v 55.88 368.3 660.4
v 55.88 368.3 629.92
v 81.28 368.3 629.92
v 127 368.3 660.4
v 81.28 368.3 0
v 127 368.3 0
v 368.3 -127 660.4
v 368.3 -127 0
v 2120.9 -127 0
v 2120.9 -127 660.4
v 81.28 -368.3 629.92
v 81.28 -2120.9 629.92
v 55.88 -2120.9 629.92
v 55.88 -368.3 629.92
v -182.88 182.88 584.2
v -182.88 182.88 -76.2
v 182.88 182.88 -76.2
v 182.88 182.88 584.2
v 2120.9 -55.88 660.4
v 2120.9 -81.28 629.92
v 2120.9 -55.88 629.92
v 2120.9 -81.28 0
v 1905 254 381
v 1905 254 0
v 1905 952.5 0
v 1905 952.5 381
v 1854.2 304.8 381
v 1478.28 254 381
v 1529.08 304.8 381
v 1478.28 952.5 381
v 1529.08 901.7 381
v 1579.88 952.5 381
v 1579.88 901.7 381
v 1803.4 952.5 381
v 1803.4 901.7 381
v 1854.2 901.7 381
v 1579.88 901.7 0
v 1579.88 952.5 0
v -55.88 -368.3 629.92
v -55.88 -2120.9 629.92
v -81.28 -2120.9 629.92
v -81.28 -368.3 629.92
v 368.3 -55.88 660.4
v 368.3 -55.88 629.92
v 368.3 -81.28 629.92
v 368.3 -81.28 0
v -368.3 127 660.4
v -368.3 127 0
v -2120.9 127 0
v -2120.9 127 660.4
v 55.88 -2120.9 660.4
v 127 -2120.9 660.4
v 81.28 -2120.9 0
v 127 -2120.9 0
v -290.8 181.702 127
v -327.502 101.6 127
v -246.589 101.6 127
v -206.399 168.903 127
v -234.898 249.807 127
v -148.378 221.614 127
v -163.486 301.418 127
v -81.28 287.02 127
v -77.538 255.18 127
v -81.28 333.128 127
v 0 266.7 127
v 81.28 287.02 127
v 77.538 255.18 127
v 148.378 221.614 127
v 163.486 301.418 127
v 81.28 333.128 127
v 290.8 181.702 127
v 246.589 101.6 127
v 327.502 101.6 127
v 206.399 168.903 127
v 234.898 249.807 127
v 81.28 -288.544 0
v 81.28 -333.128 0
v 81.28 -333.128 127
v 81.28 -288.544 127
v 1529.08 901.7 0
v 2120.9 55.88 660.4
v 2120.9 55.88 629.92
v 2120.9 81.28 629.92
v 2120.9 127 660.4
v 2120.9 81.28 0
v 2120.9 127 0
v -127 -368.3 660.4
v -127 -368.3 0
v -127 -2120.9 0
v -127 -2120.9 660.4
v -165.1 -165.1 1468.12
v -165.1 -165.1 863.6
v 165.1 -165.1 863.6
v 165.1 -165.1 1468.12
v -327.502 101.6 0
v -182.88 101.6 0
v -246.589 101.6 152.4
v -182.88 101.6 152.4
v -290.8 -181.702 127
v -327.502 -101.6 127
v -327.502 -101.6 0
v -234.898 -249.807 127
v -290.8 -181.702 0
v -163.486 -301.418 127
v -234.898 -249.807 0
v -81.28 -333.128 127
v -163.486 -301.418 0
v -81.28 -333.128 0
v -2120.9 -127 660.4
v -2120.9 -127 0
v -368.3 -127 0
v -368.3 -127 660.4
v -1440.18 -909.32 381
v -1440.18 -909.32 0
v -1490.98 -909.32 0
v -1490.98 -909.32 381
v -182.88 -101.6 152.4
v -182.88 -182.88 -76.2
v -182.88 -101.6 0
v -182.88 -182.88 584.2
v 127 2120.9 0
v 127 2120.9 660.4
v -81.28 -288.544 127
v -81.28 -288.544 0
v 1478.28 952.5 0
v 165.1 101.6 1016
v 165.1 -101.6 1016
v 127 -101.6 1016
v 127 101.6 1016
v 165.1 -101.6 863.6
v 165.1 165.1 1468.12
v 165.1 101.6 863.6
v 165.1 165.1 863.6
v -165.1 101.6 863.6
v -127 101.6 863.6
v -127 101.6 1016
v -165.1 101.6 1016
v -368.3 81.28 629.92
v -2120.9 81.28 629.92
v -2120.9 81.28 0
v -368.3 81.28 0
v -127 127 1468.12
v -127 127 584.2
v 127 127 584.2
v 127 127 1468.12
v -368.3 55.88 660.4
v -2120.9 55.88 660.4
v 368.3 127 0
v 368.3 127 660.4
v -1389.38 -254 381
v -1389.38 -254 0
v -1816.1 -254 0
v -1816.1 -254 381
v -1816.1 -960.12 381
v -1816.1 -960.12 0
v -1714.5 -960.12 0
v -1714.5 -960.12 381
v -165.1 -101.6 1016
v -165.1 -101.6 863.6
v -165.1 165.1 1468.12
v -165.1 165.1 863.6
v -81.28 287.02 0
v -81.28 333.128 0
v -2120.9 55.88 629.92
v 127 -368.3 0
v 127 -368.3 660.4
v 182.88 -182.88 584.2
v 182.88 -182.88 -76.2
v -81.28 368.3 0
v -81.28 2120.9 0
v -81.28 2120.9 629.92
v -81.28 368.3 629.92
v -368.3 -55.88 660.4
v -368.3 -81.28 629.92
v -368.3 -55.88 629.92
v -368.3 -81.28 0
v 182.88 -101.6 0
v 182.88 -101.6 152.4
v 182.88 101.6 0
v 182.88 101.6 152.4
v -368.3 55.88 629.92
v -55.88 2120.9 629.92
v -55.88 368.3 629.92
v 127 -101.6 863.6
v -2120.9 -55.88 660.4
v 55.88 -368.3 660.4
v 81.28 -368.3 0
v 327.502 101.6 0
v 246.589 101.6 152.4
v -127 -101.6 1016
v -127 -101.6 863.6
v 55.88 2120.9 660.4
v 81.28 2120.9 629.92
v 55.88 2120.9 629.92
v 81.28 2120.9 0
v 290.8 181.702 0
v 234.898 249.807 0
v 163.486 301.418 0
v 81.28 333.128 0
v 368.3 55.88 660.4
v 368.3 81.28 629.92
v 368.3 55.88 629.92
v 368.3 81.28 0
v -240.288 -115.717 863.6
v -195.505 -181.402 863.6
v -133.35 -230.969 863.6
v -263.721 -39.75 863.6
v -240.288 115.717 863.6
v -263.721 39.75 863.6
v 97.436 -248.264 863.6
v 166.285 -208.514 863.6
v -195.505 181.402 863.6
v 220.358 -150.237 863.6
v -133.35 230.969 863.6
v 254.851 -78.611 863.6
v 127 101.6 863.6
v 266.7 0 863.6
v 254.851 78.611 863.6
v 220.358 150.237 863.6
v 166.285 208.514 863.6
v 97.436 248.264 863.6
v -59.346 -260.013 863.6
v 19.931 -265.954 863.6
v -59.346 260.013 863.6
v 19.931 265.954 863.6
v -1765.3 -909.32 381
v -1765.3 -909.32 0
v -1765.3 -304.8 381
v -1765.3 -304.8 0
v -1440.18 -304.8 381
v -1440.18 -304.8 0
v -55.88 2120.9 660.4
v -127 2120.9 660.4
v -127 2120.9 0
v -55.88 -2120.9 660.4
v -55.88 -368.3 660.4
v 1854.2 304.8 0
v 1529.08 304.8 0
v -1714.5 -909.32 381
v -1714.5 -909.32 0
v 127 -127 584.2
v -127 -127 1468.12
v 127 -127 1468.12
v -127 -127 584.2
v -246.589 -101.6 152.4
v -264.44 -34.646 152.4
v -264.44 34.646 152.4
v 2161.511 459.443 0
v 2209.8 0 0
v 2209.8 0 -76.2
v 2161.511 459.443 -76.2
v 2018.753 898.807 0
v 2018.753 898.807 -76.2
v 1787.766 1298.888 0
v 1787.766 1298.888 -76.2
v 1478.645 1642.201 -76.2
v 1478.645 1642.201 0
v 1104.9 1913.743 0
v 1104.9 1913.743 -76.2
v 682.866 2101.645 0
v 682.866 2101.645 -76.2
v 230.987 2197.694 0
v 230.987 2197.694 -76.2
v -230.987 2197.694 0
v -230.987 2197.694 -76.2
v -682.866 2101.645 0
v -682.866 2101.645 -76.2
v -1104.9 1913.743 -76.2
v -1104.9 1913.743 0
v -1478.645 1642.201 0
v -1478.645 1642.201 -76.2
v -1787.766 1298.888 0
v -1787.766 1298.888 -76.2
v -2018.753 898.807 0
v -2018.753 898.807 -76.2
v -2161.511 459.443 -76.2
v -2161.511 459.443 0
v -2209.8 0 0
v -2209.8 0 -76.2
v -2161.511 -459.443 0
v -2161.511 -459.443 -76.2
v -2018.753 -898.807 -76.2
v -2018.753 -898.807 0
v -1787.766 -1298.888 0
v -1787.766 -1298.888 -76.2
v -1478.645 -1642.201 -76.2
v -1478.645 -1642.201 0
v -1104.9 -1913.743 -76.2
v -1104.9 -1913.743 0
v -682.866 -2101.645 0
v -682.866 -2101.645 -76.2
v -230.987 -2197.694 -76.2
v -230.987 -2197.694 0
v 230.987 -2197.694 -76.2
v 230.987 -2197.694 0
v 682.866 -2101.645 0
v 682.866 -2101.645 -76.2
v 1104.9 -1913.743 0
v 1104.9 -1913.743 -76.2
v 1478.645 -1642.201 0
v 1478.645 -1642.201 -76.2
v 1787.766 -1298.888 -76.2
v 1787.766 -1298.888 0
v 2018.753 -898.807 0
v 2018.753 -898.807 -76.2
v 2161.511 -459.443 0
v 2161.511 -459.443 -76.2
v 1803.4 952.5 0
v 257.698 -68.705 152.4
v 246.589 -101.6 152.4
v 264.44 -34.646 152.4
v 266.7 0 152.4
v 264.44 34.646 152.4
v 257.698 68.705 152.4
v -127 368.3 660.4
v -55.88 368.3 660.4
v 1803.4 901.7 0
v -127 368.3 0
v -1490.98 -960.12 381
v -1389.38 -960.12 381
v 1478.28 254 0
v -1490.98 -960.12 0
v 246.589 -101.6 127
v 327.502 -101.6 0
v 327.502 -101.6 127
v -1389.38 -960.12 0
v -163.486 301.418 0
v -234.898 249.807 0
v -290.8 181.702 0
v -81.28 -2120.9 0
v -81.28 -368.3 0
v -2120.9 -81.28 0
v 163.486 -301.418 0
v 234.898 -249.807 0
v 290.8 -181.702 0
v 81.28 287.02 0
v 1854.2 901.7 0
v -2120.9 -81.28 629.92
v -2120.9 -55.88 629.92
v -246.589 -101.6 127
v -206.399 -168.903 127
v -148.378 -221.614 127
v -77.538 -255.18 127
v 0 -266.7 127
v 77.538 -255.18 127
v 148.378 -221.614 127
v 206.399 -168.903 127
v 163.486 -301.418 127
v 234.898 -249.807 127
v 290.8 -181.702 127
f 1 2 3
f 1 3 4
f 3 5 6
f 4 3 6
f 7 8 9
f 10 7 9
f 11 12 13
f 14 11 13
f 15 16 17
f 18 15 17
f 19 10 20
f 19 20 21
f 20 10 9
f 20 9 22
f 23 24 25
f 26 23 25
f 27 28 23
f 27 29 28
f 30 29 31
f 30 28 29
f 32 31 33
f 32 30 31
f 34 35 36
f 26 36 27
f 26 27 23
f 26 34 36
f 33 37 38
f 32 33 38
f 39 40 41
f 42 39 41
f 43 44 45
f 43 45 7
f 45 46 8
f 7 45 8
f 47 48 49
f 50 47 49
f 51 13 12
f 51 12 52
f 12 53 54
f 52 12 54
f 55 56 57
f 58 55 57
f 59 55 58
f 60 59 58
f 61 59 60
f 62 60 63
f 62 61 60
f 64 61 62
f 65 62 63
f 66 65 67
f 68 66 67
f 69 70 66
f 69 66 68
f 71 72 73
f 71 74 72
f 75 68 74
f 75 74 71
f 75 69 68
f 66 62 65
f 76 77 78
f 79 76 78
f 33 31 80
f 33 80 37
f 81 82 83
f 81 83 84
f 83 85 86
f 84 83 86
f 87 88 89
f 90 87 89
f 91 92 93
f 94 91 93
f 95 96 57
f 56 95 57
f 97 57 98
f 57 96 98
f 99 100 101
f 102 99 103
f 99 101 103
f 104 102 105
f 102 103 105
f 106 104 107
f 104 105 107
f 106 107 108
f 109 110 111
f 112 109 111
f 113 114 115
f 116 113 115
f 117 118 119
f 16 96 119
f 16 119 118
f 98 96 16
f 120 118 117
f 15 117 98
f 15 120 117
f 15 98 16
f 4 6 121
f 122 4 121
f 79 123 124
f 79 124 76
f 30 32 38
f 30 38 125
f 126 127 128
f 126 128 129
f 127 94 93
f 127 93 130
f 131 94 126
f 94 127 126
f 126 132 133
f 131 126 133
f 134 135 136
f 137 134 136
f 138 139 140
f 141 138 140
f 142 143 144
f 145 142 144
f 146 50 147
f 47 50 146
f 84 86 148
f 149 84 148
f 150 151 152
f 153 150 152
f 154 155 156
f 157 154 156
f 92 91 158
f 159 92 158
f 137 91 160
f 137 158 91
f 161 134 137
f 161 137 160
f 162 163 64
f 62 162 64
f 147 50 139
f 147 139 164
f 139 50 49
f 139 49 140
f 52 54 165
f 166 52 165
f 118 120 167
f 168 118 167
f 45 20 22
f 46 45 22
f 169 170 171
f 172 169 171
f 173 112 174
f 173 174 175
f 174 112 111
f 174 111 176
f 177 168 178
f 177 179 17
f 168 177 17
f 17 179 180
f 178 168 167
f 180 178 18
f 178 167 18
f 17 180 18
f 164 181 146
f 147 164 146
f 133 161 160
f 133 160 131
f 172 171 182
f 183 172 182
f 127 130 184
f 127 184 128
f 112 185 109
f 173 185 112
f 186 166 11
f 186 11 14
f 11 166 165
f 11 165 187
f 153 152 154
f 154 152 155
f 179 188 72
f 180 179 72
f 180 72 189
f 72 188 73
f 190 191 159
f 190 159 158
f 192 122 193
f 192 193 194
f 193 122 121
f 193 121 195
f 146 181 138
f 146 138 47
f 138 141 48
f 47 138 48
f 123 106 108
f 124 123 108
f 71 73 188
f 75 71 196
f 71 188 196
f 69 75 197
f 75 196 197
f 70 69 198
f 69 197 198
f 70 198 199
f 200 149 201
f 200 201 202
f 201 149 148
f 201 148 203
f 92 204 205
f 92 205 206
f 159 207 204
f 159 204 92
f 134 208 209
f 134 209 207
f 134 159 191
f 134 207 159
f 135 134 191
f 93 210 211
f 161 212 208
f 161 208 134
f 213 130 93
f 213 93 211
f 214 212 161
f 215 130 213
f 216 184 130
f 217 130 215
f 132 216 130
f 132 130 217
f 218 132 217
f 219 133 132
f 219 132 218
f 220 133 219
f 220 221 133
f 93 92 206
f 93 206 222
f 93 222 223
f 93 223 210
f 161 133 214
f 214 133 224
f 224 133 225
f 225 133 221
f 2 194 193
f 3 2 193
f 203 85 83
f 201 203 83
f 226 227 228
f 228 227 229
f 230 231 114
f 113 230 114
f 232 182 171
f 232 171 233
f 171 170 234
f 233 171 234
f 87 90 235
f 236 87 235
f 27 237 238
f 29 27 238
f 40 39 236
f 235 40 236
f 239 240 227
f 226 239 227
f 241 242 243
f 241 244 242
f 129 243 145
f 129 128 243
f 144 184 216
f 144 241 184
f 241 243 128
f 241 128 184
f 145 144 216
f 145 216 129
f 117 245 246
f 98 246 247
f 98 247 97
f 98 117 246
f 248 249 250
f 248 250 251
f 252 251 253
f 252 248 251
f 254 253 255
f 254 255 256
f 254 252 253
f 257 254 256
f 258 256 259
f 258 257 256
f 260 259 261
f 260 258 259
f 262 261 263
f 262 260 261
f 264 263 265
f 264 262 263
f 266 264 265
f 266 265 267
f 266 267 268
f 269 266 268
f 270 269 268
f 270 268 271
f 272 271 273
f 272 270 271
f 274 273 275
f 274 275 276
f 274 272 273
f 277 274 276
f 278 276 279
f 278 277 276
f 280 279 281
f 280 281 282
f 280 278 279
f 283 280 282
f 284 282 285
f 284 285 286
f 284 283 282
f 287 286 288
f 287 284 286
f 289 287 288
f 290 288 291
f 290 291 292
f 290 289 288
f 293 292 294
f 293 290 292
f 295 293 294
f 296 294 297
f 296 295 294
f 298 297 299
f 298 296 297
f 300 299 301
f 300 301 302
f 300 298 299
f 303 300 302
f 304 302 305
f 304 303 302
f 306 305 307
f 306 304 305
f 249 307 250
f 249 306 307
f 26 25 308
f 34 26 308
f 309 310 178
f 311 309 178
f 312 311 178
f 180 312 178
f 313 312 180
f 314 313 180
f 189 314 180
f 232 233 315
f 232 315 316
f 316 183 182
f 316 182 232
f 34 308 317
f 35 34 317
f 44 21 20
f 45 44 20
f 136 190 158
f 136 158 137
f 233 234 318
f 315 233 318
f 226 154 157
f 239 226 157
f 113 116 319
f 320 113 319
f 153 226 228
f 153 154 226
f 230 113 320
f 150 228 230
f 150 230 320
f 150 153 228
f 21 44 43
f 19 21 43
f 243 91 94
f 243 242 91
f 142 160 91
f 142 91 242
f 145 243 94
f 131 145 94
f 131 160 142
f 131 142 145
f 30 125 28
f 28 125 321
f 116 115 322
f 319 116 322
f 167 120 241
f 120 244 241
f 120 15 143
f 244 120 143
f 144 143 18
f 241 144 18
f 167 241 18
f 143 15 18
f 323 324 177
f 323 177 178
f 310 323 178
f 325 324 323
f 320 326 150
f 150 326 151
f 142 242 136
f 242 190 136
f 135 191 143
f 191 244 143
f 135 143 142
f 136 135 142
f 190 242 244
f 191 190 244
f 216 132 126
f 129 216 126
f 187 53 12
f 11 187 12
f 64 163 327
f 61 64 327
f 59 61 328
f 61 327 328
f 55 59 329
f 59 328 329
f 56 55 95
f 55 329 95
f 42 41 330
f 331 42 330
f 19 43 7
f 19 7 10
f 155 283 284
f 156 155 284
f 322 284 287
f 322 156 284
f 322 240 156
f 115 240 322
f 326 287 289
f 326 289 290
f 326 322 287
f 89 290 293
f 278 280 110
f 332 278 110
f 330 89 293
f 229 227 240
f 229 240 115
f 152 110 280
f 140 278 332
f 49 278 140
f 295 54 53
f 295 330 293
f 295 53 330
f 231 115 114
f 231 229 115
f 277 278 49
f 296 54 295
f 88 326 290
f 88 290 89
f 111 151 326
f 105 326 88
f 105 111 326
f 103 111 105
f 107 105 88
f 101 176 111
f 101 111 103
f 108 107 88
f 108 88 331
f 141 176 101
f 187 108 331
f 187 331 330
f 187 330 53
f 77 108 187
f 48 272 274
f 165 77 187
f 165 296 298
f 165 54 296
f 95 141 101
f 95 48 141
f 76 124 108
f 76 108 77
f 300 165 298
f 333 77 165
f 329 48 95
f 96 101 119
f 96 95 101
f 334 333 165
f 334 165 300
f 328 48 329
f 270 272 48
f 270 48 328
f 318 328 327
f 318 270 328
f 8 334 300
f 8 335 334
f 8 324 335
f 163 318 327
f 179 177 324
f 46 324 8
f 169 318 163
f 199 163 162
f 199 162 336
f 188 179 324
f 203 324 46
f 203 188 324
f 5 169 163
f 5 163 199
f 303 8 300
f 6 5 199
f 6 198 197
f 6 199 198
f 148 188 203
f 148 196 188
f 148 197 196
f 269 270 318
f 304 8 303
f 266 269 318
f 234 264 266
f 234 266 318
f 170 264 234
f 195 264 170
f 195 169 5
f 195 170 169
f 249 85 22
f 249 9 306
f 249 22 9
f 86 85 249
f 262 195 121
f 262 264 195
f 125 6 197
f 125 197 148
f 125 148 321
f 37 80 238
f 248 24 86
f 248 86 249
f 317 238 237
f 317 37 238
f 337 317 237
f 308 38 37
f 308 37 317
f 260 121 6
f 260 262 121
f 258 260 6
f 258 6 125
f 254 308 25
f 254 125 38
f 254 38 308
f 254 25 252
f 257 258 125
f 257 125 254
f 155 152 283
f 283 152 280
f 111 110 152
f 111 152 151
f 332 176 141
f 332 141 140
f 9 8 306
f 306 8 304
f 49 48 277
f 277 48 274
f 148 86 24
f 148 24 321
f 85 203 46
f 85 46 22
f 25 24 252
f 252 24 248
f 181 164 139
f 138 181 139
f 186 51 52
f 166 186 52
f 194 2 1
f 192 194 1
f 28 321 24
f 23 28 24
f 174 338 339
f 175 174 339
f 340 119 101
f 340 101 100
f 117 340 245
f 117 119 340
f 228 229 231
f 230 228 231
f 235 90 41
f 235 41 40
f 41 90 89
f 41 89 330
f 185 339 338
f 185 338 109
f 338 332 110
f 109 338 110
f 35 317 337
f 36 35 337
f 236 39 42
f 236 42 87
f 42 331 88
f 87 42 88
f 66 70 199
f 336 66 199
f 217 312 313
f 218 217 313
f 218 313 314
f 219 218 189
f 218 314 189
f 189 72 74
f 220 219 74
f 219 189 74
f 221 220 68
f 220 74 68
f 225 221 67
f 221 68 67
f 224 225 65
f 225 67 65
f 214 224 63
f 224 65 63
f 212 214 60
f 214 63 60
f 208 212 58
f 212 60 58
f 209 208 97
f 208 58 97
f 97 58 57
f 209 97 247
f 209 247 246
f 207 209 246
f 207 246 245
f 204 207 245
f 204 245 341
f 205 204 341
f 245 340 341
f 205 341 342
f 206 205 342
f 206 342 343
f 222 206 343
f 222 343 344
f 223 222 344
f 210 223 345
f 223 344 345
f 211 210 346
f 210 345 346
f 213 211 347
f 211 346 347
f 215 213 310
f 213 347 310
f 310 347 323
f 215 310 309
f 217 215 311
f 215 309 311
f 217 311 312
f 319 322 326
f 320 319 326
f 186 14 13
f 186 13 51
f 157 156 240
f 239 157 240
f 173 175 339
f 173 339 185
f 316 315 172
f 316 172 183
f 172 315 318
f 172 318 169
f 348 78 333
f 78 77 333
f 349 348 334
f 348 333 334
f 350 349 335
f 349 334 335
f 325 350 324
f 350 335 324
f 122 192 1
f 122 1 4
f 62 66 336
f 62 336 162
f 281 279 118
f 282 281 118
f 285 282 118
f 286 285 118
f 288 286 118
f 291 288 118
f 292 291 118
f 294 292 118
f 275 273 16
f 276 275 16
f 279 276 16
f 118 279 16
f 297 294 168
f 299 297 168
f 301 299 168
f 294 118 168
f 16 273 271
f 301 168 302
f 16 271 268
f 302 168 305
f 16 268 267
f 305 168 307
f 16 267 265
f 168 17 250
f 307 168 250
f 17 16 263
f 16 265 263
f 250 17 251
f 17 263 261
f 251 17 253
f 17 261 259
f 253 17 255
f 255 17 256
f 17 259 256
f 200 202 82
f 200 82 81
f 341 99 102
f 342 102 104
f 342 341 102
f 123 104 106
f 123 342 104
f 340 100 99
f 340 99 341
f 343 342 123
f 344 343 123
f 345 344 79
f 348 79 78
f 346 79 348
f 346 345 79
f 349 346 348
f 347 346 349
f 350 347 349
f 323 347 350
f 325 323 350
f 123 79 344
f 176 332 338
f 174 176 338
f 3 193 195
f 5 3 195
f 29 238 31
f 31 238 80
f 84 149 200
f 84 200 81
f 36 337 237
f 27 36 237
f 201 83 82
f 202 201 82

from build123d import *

# Parameters (mm, degrees)
F0_R      = 2209.8
F0_R_2    = 342.9
F0_R_3    = 266.7
F0_W      = 365.76
F0_H      = 365.76
F0_W_2    = 223.52
F0_H_2    = 50.8
F1_DEPTH  = 76.2
F0_W_3    = 355.6
F0_H_3    = 355.6
F0_W_4    = 254
F0_H_4    = 254
F2_DEPTH  = 863.6
F3_DEPTH  = 584.2
F4_W      = 330.2
F4_H      = 330.2
F4_W_2    = 254
F4_H_2    = 254
F5_DEPTH  = 604.52
F6_DEPTH  = 127
F7_W      = 203.2
F7_H      = 152.4
F8_DEPTH  = 350.52
F9_DEPTH  = 660.4
F10_W     = 111.76
F10_H     = 30.48
F11_DEPTH = 1832.356
F12_W     = 111.76
F12_H     = 31.626664176
F13_DEPTH = 1793.24
F14_W     = 111.76
F14_H     = 31.626664176
F15_DEPTH = 1833.88
F16_W     = 111.76
F16_H     = 31.626664176
F17_DEPTH = 1811.02
F18_DEPTH = 381
F19_W     = 203.2
F19_H     = 152.4
F20_DEPTH = 347.472


# Not quite as in the source:
# - a feature names something its author has since deleted; it is built from what else it names


with BuildPart() as f1:
    # F0 (on Top) → F1 (new body)
    with BuildSketch(Plane.XY):
        Circle(F0_R)
        Polygon((-1490.98, -960.12), (-1714.5, -960.12), (-1816.1, -960.12), (-1816.1, -254), (-1389.38, -254), (-1389.38, -960.12), align=None, mode=Mode.SUBTRACT)
        Polygon((127, -2120.9), (-127, -2120.9), (-127, -368.3), (-1.175e-06, -368.3), (127, -368.3), align=None, mode=Mode.SUBTRACT)
        Polygon((-368.3, 127), (-368.3, 5.095e-07), (-368.3, -127), (-2120.9, -127), (-2120.9, 127), align=None, mode=Mode.SUBTRACT)
        with BuildLine():
            ThreePointArc((368.3, 0), (260.4274270956, -260.4274279264), (-1.175e-06, -368.3))
            ThreePointArc((-1.175e-06, -368.3), (-260.4274281066, -260.4274269154), (-368.3, 5.095e-07))
            ThreePointArc((-368.3, 5.095e-07), (-260.4274272736, 260.4274277484), (1.62e-07, 368.3))
            ThreePointArc((1.62e-07, 368.3), (260.4274275683, 260.4274274537), (368.3, 0))
        make_face(mode=Mode.SUBTRACT)
        Polygon((368.3, -127), (368.3, 0), (368.3, 127), (2120.9, 127), (2120.9, -127), align=None, mode=Mode.SUBTRACT)
        Polygon((1579.88, 952.5), (1803.4, 952.5), (1905, 952.5), (1905, 254), (1478.28, 254), (1478.28, 952.5), align=None, mode=Mode.SUBTRACT)
        Polygon((127, 368.3), (1.62e-07, 368.3), (-127, 368.3), (-127, 2120.9), (127, 2120.9), align=None, mode=Mode.SUBTRACT)
        Polygon((-127, 368.3), (1.62e-07, 368.3), (127, 368.3), (127, 2120.9), (-127, 2120.9), align=None)
        Polygon((368.3, 127), (368.3, 0), (368.3, -127), (2120.9, -127), (2120.9, 127), align=None)
        Polygon((-368.3, -127), (-368.3, 5.095e-07), (-368.3, 127), (-2120.9, 127), (-2120.9, -127), align=None)
        Polygon((-127, -368.3), (-127, -2120.9), (127, -2120.9), (127, -368.3), (-1.175e-06, -368.3), align=None)
        with BuildLine():
            ThreePointArc((-368.3, 5.095e-07), (-260.4274281066, -260.4274269154), (-1.175e-06, -368.3))
            ThreePointArc((-1.175e-06, -368.3), (260.4274270956, -260.4274279264), (368.3, 0))
            ThreePointArc((368.3, 0), (260.4274275683, 260.4274274537), (1.62e-07, 368.3))
            ThreePointArc((1.62e-07, 368.3), (-260.4274272736, 260.4274277484), (-368.3, 5.095e-07))
        make_face()
        Circle(F0_R_2, mode=Mode.SUBTRACT)
        Circle(F0_R_2)
        Circle(F0_R_3, mode=Mode.SUBTRACT)
        Circle(F0_R_3)
        Rectangle(F0_W, F0_H, mode=Mode.SUBTRACT)
        Polygon((-1440.18, -304.8), (-1765.3, -304.8), (-1765.3, -909.32), (-1714.5, -909.32), (-1490.98, -909.32), (-1440.18, -909.32), align=None)
        Polygon((1529.08, 304.8), (1854.2, 304.8), (1854.2, 901.7), (1803.4, 901.7), (1579.88, 901.7), (1529.08, 901.7), align=None)
        Polygon((-1765.3, -909.32), (-1765.3, -304.8), (-1440.18, -304.8), (-1440.18, -909.32), (-1490.98, -909.32), (-1490.98, -960.12), (-1389.38, -960.12), (-1389.38, -254), (-1816.1, -254), (-1816.1, -960.12), (-1714.5, -960.12), (-1714.5, -909.32), align=None)
        Polygon((1854.2, 901.7), (1854.2, 304.8), (1529.08, 304.8), (1529.08, 901.7), (1579.88, 901.7), (1579.88, 952.5), (1478.28, 952.5), (1478.28, 254), (1905, 254), (1905, 952.5), (1803.4, 952.5), (1803.4, 901.7), align=None)
        with Locations((1691.64, 927.1)):
            Rectangle(F0_W_2, F0_H_2)
        with Locations((-1602.74, -934.72)):
            Rectangle(F0_W_2, F0_H_2)
    extrude(amount=-F1_DEPTH)

    # F0 (on Top) → F2 (join)
    with BuildSketch(Plane.XY):
        Circle(F0_R_3)
        Rectangle(F0_W, F0_H, mode=Mode.SUBTRACT)
        Rectangle(F0_W, F0_H)
        Rectangle(F0_W_3, F0_H_3, mode=Mode.SUBTRACT)
        Rectangle(F0_W_3, F0_H_3)
        Rectangle(F0_W_4, F0_H_4, mode=Mode.SUBTRACT)
    extrude(amount=F2_DEPTH)

    # F0 (on Top) → F3 (cut)
    with BuildSketch(Plane.XY):
        Rectangle(F0_W, F0_H)
        Rectangle(F0_W_3, F0_H_3, mode=Mode.SUBTRACT)
        Rectangle(F0_W_3, F0_H_3)
        Rectangle(F0_W_4, F0_H_4, mode=Mode.SUBTRACT)
        Rectangle(F0_W_4, F0_H_4)
    extrude(amount=F3_DEPTH, mode=Mode.SUBTRACT)

    # F4 (on face) → F5 (join)
    with BuildSketch(Plane.XY.offset(863.6)):
        Rectangle(F4_W, F4_H)
        Rectangle(F4_W_2, F4_H_2, mode=Mode.SUBTRACT)
    extrude(amount=F5_DEPTH)

    # F0 (on Top) → F6 (join)
    with BuildSketch(Plane.XY):
        Circle(F0_R_2)
        Circle(F0_R_3, mode=Mode.SUBTRACT)
    extrude(amount=F6_DEPTH)

    # F7 (on Right) → F8 (cut, symmetric)
    with BuildSketch(Plane.YZ):
        with Locations((0, 76.2)):
            Rectangle(F7_W, F7_H)
    extrude(amount=F8_DEPTH, both=True, mode=Mode.SUBTRACT)

    # F0 (on Top) → F9 (join)
    with BuildSketch(Plane.XY):
        Polygon((-127, -368.3), (-127, -2120.9), (127, -2120.9), (127, -368.3), (-1.175e-06, -368.3), align=None)
        Polygon((-368.3, -127), (-368.3, 5.095e-07), (-368.3, 127), (-2120.9, 127), (-2120.9, -127), align=None)
        Polygon((-127, 368.3), (1.62e-07, 368.3), (127, 368.3), (127, 2120.9), (-127, 2120.9), align=None)
        Polygon((368.3, 127), (368.3, 0), (368.3, -127), (2120.9, -127), (2120.9, 127), align=None)
    extrude(amount=F9_DEPTH)

    # F10 (on face) → F11 (cut)
    with BuildSketch(Plane.XZ.offset(2120.9)):
        Polygon((-55.88, 629.92), (-81.28, 629.92), (-81.28, 0), (81.28, 0), (81.28, 629.92), (55.88, 629.92), align=None)
        with Locations((0, 645.16)):
            Rectangle(F10_W, F10_H)
    extrude(amount=-F11_DEPTH, mode=Mode.SUBTRACT)

    # F12 (on face) → F13 (cut)
    with BuildSketch(Plane(origin=(-2120.9, 0, 0), x_dir=(0, -1, 0), z_dir=(-1, 0, 0))):
        Polygon((-55.88, 629.92), (-81.28, 629.92), (-81.28, 0), (81.28, 0), (81.28, 629.92), (55.88, 629.92), align=None)
        with Locations((0, 645.733332088)):
            Rectangle(F12_W, F12_H)
    extrude(amount=-F13_DEPTH, mode=Mode.SUBTRACT)

    # F14 (on face) → F15 (cut)
    with BuildSketch(Plane(origin=(0, 2120.9, 0), x_dir=(-1, 0, 0), z_dir=(0, 1, 0))):
        Polygon((-55.88, 629.92), (-81.28, 629.92), (-81.28, 0), (81.28, 0), (81.28, 629.92), (55.88, 629.92), align=None)
        with Locations((0, 645.733332088)):
            Rectangle(F14_W, F14_H)
    extrude(amount=-F15_DEPTH, mode=Mode.SUBTRACT)

    # F16 (on face) → F17 (cut)
    with BuildSketch(Plane.YZ.offset(2120.9)):
        Polygon((-55.88, 629.92), (-81.28, 629.92), (-81.28, 0), (81.28, 0), (81.28, 629.92), (55.88, 629.92), align=None)
        with Locations((0, 645.733332088)):
            Rectangle(F16_W, F16_H)
    extrude(amount=-F17_DEPTH, mode=Mode.SUBTRACT)

    # F0 (on Top) → F18 (join)
    with BuildSketch(Plane.XY):
        Polygon((-1765.3, -909.32), (-1765.3, -304.8), (-1440.18, -304.8), (-1440.18, -909.32), (-1490.98, -909.32), (-1490.98, -960.12), (-1389.38, -960.12), (-1389.38, -254), (-1816.1, -254), (-1816.1, -960.12), (-1714.5, -960.12), (-1714.5, -909.32), align=None)
        Polygon((1854.2, 901.7), (1854.2, 304.8), (1529.08, 304.8), (1529.08, 901.7), (1579.88, 901.7), (1579.88, 952.5), (1478.28, 952.5), (1478.28, 254), (1905, 254), (1905, 952.5), (1803.4, 952.5), (1803.4, 901.7), align=None)
    extrude(amount=F18_DEPTH)

    # F19 (on face) → F20 (cut)
    with BuildSketch(Plane.YZ.offset(165.1)):
        with Locations((0, 939.8)):
            Rectangle(F19_W, F19_H)
    extrude(amount=-F20_DEPTH, mode=Mode.SUBTRACT)


solid = f1.part
